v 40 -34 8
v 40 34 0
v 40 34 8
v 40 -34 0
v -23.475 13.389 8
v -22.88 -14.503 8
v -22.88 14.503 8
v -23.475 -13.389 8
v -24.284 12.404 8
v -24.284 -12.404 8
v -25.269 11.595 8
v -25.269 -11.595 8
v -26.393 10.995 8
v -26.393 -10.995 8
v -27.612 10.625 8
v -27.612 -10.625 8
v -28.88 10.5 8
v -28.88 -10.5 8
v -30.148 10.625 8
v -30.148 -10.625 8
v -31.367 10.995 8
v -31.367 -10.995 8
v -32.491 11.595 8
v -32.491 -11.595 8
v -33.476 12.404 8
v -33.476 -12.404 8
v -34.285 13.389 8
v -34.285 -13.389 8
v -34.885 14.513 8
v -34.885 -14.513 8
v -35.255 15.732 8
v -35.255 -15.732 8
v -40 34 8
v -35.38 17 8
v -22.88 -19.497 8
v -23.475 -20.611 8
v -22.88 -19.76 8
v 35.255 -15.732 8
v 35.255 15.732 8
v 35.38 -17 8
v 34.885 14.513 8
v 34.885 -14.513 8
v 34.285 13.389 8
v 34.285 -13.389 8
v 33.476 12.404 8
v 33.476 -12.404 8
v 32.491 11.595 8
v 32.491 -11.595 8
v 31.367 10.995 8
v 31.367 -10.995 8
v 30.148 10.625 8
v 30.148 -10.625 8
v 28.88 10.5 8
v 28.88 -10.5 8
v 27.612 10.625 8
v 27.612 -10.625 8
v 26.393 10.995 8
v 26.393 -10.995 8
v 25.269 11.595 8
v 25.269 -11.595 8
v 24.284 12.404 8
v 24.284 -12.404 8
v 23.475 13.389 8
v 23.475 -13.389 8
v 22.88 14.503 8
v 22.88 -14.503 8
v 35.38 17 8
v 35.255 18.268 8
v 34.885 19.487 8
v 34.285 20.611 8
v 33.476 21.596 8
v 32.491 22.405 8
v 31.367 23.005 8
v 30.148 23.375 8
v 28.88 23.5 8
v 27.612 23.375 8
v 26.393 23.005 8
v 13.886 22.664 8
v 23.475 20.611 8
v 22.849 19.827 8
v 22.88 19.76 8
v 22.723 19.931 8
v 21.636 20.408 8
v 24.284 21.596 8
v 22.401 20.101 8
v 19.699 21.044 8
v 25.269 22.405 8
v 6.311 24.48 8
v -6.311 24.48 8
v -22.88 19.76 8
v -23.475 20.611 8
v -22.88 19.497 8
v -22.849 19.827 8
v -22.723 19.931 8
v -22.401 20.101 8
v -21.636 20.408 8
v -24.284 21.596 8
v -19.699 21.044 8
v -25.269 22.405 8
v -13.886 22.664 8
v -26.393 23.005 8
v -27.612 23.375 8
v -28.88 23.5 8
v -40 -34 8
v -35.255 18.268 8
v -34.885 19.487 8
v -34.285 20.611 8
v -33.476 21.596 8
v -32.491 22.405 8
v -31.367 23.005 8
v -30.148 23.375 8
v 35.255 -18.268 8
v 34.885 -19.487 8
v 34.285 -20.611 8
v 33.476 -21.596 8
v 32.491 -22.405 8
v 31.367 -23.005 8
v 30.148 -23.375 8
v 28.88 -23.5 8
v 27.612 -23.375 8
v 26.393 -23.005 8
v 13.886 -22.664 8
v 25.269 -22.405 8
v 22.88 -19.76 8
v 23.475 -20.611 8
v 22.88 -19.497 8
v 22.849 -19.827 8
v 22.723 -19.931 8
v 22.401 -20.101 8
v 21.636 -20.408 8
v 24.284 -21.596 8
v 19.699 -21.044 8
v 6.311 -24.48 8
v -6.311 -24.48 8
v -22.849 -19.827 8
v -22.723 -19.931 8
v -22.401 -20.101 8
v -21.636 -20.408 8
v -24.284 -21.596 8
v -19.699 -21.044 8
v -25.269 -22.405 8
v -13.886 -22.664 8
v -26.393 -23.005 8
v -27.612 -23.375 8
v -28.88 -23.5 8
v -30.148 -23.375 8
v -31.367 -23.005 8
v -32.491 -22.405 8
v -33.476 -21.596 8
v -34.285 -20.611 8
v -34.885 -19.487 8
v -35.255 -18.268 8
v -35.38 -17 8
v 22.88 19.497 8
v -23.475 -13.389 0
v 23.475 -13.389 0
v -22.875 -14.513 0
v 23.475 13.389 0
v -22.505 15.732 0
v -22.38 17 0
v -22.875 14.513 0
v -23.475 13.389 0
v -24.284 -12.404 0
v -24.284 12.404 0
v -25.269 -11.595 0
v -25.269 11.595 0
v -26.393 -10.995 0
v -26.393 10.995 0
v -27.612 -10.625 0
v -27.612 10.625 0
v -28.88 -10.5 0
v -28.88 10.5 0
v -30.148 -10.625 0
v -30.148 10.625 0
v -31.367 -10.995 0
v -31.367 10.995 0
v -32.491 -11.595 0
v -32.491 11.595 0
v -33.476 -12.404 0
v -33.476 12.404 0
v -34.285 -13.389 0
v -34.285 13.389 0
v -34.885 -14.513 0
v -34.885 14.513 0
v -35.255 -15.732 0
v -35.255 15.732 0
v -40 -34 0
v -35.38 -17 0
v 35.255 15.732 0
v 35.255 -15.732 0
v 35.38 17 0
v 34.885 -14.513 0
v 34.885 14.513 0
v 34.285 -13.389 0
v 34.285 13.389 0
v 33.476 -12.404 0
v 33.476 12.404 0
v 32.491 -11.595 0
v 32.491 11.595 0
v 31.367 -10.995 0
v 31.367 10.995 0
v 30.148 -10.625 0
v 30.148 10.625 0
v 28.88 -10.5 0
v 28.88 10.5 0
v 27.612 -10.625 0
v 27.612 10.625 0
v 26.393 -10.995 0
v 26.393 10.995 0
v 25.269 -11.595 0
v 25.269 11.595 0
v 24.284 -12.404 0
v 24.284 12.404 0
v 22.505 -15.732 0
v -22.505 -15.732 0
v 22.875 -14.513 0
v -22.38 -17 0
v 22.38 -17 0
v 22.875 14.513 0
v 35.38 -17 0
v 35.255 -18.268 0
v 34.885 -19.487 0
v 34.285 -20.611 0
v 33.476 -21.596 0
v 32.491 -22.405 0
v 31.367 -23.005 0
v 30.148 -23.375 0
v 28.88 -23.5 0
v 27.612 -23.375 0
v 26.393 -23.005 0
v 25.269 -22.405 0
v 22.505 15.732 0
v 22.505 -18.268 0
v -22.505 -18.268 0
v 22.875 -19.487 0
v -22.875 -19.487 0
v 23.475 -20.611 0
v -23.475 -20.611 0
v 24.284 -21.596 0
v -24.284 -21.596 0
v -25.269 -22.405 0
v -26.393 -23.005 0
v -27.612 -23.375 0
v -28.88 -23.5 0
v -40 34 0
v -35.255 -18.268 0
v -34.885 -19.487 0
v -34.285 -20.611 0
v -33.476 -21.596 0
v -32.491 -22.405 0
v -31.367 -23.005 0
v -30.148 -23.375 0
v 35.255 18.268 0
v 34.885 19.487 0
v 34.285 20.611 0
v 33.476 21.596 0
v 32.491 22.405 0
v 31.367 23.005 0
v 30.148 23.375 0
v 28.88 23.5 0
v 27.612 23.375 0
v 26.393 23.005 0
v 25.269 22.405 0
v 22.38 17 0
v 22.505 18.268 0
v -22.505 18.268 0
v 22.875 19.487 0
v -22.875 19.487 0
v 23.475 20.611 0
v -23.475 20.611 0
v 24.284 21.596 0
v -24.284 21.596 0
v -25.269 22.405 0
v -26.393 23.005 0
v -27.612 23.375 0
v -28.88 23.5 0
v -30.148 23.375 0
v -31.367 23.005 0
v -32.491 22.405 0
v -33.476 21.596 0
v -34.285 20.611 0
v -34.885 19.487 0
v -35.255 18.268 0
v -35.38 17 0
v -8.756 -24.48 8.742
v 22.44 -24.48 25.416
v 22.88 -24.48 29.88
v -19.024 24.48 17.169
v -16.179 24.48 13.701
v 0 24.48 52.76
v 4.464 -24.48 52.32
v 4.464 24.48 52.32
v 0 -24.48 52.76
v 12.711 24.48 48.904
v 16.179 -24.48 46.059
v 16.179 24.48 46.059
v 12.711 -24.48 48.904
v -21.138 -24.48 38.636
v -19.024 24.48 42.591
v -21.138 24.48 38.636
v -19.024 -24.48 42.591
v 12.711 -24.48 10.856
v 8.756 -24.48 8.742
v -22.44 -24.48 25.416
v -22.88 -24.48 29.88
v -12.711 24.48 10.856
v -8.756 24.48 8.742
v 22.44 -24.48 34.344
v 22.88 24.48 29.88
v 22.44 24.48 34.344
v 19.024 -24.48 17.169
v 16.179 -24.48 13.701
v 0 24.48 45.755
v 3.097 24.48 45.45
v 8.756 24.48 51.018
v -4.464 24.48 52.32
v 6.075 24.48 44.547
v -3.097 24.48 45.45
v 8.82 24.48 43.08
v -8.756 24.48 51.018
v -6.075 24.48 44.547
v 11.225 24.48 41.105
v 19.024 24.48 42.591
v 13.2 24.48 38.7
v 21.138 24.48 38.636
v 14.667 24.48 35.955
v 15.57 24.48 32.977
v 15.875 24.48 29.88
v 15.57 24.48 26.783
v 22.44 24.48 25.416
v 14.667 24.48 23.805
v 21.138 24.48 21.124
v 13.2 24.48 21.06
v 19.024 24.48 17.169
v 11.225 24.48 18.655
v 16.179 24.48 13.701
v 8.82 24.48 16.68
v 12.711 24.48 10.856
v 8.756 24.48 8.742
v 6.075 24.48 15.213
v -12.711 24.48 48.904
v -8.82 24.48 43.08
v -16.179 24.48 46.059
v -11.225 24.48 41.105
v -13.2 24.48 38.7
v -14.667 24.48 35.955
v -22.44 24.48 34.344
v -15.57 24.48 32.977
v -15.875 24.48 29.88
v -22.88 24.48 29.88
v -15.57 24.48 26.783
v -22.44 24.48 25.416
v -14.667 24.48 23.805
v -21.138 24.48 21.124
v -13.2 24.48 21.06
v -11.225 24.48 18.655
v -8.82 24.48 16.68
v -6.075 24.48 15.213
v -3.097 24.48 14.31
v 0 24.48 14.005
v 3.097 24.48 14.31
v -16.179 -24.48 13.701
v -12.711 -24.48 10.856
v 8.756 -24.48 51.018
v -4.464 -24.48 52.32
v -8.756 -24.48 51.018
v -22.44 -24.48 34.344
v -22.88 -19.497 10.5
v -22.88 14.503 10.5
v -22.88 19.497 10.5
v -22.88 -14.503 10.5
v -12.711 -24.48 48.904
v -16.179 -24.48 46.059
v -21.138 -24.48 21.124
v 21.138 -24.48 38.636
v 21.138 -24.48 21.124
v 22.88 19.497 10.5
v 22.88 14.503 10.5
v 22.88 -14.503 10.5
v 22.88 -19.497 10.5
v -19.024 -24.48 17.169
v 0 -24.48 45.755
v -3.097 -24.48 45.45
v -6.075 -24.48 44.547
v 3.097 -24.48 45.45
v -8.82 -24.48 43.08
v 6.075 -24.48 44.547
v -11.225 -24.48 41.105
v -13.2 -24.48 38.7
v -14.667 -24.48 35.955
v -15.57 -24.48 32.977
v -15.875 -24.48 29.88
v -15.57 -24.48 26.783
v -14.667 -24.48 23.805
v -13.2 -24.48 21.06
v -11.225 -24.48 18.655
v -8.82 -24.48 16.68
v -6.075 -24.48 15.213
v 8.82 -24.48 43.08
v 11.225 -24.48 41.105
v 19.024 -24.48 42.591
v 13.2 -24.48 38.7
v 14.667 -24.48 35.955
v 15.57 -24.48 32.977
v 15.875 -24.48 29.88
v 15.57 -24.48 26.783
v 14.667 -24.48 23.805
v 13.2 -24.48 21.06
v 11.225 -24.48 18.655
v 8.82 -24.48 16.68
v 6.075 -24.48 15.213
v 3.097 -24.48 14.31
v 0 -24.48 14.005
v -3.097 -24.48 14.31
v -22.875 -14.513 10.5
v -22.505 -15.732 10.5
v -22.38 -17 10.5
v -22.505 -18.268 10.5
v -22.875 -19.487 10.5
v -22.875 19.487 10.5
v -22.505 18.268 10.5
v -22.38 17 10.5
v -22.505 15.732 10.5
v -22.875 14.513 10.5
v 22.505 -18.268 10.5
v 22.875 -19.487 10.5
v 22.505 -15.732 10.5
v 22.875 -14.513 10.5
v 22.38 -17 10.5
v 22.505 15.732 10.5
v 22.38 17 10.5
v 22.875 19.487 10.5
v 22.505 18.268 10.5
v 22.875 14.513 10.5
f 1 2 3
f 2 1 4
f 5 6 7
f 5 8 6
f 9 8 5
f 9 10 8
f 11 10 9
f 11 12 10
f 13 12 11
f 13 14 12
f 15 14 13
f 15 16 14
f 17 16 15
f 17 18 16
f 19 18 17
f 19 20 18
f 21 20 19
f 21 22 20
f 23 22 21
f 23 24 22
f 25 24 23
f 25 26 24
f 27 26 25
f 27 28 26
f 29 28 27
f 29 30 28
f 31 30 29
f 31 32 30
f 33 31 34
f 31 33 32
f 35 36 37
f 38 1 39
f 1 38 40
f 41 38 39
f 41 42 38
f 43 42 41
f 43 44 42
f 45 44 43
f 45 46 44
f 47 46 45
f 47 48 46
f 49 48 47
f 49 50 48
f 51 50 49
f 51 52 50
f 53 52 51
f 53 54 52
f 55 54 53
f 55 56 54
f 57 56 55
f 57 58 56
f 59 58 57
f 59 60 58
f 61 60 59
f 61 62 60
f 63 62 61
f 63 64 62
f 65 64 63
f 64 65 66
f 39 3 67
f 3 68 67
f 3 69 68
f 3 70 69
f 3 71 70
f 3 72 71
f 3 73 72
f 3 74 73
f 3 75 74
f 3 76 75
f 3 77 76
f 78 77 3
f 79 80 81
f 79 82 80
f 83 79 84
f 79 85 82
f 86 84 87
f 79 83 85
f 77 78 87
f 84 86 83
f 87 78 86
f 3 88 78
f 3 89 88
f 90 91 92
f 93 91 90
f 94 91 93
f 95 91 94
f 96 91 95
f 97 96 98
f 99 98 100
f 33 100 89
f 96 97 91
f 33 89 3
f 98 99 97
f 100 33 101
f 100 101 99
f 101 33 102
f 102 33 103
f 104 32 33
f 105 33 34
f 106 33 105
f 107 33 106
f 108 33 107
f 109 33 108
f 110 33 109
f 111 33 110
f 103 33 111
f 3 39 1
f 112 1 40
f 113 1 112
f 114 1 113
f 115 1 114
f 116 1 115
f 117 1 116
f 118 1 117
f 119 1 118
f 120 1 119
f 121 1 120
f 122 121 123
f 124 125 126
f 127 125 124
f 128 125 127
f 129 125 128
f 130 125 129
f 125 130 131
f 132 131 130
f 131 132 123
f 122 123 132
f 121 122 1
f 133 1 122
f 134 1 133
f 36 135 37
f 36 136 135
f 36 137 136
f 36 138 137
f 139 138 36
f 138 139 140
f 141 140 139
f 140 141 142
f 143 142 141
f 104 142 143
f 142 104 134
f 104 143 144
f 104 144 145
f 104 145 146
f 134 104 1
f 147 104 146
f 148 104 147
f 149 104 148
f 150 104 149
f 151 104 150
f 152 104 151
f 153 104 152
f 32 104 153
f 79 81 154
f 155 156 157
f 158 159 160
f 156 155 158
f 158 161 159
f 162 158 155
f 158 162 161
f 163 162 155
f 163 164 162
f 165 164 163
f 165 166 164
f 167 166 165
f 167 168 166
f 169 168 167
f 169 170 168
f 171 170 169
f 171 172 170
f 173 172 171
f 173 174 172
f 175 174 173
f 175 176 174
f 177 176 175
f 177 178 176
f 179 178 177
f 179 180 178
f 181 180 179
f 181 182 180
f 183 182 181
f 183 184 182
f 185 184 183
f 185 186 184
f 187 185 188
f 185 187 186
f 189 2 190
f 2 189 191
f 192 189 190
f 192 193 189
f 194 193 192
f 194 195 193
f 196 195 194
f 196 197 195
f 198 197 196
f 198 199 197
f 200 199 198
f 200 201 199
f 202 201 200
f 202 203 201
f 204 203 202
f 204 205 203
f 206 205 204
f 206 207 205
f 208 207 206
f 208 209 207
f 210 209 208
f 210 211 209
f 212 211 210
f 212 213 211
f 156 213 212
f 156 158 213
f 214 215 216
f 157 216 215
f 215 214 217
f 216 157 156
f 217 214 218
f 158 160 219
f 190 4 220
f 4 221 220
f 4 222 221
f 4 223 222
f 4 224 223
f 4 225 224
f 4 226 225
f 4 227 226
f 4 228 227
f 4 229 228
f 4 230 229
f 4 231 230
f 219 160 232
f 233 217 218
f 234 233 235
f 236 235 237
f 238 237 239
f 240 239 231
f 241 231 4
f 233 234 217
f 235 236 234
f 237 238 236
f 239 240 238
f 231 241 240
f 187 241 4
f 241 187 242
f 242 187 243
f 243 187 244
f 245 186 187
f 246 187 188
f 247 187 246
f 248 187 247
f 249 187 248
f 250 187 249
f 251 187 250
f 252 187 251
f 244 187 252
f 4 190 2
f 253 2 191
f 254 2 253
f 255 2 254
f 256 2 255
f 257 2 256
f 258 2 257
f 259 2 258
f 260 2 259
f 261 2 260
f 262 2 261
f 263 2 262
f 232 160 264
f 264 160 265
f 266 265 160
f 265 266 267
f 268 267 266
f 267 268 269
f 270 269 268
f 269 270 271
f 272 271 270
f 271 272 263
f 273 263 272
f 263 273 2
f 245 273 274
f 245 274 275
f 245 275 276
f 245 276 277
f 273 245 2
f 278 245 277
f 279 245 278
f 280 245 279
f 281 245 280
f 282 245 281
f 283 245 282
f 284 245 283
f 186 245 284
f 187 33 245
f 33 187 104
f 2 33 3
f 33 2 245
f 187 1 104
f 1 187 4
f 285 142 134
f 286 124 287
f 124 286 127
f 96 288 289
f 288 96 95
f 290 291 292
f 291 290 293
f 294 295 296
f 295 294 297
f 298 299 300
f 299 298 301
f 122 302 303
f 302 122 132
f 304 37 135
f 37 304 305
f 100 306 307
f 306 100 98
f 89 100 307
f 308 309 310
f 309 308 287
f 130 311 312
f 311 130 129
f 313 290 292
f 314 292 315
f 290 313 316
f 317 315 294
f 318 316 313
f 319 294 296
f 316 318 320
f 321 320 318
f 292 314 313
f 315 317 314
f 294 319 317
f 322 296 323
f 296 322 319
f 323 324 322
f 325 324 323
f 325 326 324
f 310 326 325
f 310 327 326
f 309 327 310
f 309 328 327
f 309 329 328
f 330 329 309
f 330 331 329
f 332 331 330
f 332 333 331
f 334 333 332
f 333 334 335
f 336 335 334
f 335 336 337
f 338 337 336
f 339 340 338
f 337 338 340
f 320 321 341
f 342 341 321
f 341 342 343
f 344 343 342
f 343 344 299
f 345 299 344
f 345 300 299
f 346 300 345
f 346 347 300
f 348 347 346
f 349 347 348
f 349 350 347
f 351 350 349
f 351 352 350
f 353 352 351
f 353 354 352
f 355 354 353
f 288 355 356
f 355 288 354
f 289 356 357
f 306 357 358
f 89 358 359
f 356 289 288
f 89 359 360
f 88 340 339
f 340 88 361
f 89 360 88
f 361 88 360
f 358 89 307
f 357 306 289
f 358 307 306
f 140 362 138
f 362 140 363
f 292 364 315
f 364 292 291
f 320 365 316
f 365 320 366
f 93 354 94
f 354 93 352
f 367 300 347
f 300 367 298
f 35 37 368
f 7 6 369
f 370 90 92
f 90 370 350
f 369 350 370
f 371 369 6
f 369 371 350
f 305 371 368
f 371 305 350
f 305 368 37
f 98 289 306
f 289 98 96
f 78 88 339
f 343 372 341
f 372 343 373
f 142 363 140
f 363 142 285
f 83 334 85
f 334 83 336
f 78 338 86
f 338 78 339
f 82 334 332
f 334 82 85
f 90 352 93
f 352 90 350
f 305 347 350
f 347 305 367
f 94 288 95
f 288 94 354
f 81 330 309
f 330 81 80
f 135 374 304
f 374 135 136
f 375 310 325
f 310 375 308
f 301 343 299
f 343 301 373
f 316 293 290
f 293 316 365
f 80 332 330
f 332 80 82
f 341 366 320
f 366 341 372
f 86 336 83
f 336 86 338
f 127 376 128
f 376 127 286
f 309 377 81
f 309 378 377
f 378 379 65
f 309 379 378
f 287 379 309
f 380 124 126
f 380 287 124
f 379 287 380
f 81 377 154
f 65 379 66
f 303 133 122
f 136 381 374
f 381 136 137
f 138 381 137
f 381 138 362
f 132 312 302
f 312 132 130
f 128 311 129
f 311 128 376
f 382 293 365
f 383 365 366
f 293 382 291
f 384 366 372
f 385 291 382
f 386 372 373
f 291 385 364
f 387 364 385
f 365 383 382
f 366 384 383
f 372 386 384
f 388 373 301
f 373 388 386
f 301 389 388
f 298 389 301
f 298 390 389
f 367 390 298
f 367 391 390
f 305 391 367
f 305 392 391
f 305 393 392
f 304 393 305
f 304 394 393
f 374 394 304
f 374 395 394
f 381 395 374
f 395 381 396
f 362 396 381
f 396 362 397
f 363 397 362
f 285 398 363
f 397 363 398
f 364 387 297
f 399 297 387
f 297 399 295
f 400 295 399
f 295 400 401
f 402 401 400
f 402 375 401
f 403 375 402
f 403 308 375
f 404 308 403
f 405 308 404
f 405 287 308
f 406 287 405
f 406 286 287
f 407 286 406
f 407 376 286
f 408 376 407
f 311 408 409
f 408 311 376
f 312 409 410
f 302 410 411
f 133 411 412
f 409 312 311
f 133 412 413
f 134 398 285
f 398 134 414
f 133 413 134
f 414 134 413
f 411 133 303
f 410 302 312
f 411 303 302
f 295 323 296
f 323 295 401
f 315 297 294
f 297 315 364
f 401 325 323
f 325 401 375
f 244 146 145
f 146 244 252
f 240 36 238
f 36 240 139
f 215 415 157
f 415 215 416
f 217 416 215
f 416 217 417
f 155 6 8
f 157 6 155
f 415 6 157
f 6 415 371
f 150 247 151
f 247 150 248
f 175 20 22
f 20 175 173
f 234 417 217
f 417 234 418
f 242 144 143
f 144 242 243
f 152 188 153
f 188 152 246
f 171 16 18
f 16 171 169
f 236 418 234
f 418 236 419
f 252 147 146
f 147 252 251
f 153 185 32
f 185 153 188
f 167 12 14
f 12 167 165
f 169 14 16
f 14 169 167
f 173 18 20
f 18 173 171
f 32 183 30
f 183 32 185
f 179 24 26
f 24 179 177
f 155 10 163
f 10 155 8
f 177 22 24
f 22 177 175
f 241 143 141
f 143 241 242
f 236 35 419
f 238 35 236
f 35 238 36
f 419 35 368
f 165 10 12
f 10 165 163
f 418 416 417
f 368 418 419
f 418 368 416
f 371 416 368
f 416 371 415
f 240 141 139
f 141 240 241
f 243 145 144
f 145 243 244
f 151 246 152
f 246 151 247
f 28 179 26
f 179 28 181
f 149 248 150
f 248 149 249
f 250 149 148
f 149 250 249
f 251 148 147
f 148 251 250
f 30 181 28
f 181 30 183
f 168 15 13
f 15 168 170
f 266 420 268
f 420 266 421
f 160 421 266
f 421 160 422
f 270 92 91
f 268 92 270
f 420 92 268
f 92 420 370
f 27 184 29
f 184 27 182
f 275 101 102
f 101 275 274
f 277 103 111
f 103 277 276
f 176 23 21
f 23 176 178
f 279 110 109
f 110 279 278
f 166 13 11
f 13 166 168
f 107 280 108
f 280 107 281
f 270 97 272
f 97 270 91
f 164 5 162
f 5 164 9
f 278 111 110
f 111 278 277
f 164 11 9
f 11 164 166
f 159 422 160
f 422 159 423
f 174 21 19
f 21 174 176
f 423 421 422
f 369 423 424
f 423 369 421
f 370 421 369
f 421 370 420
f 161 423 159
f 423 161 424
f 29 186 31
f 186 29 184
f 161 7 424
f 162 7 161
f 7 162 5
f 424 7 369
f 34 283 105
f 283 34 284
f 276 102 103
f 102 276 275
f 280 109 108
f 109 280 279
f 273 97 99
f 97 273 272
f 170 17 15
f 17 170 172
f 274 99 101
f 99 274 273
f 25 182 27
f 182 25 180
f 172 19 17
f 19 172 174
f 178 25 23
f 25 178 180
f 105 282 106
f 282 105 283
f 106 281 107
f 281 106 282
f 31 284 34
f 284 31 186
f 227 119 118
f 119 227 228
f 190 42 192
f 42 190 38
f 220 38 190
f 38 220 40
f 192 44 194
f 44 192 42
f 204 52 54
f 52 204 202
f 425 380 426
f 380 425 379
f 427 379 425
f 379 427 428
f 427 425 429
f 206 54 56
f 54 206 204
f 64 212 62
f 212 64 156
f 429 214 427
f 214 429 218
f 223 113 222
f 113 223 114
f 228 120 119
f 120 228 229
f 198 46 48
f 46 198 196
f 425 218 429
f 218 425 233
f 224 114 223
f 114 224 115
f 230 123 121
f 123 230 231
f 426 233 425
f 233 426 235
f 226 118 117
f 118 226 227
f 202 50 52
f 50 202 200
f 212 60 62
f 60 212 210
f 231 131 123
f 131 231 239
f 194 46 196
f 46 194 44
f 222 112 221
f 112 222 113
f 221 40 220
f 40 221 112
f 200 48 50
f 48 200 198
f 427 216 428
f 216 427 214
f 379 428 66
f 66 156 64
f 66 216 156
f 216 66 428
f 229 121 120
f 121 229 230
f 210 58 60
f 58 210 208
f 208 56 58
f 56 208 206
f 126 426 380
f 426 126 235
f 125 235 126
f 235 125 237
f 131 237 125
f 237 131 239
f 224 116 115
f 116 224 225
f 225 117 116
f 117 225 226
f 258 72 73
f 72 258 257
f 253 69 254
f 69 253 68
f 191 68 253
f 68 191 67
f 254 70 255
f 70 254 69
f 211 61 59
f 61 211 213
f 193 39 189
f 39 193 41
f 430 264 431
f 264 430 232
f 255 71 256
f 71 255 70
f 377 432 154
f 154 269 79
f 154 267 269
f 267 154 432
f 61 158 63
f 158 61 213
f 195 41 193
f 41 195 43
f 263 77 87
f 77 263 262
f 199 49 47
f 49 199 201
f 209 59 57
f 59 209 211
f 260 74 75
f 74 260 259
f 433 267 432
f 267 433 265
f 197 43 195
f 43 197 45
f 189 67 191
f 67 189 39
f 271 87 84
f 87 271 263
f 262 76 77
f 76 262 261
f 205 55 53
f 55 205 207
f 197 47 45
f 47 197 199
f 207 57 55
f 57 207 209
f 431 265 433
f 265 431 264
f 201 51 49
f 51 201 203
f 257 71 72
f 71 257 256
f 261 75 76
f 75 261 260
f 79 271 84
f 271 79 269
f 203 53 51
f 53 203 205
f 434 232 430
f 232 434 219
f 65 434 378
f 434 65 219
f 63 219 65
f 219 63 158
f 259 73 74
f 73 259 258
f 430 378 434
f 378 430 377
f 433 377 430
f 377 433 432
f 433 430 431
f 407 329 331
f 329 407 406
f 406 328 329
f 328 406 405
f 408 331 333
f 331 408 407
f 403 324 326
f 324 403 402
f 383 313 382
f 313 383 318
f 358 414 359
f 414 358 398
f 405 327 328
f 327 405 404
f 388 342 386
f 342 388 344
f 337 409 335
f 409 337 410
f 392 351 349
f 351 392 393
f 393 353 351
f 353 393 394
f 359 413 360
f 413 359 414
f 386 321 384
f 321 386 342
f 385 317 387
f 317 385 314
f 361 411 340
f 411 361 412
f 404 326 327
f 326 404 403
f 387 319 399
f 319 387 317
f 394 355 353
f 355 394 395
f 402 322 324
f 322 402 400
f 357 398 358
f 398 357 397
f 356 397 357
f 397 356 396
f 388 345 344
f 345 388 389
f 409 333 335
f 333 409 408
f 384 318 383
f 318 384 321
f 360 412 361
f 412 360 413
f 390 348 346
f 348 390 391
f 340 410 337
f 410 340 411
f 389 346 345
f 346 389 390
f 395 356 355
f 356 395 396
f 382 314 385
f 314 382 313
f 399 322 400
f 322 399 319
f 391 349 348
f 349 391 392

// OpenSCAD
$fn = 32;

// ----------------------------------------------------------------------
// Bearing block: 80 x 68 mm base, 31.75 mm bore at 29.88 mm
// ----------------------------------------------------------------------

// --- parameters (mm) ---
base_w = 80;              // base width
base_d = 68;              // base depth
base_t = 8;               // base thickness
bore_d = 31.75;           // shaft / bearing bore
house_r = 22.88;          // housing outer radius
house_len = 48.96;        // housing length along the shaft
foot_w = 45.76;           // foot width under the housing
foot_len = 38.96;         // foot length along the shaft
axis_z = 29.88;           // bore axis height above the base
holes_d = 13;             // mounting holes
hole_x = 28.88;           // mounting hole spacing

difference() {
  union() {
    /* base plate with its underside on z = 0 */
    translate([0, 0, base_t / 2]) cube([base_w, base_d, base_t], center = true);
    /* hull foot: a straight web blending into the round housing */
    hull() {
      translate([0, 0, base_t - 0.5]) cube([foot_w, foot_len, 1.6], center = true);
      translate([0, 0, axis_z]) rotate([-90, 0, 0]) cylinder(h = house_len, d = 2 * house_r, center = true);
    }
  }
  /* bore through the housing, 2.5 mm clear on both sides */
  translate([0, 0, axis_z]) rotate([-90, 0, 0]) cylinder(h = house_len + 5, d = bore_d, center = true);
  /* mounting holes through the base plate */
  for (hx = [-28.88, 28.88]) {
    for (hy = [-17, 17]) {
      translate([hx, hy, -2.5]) cylinder(h = base_t + 5, d = holes_d);
    }
  }
}
